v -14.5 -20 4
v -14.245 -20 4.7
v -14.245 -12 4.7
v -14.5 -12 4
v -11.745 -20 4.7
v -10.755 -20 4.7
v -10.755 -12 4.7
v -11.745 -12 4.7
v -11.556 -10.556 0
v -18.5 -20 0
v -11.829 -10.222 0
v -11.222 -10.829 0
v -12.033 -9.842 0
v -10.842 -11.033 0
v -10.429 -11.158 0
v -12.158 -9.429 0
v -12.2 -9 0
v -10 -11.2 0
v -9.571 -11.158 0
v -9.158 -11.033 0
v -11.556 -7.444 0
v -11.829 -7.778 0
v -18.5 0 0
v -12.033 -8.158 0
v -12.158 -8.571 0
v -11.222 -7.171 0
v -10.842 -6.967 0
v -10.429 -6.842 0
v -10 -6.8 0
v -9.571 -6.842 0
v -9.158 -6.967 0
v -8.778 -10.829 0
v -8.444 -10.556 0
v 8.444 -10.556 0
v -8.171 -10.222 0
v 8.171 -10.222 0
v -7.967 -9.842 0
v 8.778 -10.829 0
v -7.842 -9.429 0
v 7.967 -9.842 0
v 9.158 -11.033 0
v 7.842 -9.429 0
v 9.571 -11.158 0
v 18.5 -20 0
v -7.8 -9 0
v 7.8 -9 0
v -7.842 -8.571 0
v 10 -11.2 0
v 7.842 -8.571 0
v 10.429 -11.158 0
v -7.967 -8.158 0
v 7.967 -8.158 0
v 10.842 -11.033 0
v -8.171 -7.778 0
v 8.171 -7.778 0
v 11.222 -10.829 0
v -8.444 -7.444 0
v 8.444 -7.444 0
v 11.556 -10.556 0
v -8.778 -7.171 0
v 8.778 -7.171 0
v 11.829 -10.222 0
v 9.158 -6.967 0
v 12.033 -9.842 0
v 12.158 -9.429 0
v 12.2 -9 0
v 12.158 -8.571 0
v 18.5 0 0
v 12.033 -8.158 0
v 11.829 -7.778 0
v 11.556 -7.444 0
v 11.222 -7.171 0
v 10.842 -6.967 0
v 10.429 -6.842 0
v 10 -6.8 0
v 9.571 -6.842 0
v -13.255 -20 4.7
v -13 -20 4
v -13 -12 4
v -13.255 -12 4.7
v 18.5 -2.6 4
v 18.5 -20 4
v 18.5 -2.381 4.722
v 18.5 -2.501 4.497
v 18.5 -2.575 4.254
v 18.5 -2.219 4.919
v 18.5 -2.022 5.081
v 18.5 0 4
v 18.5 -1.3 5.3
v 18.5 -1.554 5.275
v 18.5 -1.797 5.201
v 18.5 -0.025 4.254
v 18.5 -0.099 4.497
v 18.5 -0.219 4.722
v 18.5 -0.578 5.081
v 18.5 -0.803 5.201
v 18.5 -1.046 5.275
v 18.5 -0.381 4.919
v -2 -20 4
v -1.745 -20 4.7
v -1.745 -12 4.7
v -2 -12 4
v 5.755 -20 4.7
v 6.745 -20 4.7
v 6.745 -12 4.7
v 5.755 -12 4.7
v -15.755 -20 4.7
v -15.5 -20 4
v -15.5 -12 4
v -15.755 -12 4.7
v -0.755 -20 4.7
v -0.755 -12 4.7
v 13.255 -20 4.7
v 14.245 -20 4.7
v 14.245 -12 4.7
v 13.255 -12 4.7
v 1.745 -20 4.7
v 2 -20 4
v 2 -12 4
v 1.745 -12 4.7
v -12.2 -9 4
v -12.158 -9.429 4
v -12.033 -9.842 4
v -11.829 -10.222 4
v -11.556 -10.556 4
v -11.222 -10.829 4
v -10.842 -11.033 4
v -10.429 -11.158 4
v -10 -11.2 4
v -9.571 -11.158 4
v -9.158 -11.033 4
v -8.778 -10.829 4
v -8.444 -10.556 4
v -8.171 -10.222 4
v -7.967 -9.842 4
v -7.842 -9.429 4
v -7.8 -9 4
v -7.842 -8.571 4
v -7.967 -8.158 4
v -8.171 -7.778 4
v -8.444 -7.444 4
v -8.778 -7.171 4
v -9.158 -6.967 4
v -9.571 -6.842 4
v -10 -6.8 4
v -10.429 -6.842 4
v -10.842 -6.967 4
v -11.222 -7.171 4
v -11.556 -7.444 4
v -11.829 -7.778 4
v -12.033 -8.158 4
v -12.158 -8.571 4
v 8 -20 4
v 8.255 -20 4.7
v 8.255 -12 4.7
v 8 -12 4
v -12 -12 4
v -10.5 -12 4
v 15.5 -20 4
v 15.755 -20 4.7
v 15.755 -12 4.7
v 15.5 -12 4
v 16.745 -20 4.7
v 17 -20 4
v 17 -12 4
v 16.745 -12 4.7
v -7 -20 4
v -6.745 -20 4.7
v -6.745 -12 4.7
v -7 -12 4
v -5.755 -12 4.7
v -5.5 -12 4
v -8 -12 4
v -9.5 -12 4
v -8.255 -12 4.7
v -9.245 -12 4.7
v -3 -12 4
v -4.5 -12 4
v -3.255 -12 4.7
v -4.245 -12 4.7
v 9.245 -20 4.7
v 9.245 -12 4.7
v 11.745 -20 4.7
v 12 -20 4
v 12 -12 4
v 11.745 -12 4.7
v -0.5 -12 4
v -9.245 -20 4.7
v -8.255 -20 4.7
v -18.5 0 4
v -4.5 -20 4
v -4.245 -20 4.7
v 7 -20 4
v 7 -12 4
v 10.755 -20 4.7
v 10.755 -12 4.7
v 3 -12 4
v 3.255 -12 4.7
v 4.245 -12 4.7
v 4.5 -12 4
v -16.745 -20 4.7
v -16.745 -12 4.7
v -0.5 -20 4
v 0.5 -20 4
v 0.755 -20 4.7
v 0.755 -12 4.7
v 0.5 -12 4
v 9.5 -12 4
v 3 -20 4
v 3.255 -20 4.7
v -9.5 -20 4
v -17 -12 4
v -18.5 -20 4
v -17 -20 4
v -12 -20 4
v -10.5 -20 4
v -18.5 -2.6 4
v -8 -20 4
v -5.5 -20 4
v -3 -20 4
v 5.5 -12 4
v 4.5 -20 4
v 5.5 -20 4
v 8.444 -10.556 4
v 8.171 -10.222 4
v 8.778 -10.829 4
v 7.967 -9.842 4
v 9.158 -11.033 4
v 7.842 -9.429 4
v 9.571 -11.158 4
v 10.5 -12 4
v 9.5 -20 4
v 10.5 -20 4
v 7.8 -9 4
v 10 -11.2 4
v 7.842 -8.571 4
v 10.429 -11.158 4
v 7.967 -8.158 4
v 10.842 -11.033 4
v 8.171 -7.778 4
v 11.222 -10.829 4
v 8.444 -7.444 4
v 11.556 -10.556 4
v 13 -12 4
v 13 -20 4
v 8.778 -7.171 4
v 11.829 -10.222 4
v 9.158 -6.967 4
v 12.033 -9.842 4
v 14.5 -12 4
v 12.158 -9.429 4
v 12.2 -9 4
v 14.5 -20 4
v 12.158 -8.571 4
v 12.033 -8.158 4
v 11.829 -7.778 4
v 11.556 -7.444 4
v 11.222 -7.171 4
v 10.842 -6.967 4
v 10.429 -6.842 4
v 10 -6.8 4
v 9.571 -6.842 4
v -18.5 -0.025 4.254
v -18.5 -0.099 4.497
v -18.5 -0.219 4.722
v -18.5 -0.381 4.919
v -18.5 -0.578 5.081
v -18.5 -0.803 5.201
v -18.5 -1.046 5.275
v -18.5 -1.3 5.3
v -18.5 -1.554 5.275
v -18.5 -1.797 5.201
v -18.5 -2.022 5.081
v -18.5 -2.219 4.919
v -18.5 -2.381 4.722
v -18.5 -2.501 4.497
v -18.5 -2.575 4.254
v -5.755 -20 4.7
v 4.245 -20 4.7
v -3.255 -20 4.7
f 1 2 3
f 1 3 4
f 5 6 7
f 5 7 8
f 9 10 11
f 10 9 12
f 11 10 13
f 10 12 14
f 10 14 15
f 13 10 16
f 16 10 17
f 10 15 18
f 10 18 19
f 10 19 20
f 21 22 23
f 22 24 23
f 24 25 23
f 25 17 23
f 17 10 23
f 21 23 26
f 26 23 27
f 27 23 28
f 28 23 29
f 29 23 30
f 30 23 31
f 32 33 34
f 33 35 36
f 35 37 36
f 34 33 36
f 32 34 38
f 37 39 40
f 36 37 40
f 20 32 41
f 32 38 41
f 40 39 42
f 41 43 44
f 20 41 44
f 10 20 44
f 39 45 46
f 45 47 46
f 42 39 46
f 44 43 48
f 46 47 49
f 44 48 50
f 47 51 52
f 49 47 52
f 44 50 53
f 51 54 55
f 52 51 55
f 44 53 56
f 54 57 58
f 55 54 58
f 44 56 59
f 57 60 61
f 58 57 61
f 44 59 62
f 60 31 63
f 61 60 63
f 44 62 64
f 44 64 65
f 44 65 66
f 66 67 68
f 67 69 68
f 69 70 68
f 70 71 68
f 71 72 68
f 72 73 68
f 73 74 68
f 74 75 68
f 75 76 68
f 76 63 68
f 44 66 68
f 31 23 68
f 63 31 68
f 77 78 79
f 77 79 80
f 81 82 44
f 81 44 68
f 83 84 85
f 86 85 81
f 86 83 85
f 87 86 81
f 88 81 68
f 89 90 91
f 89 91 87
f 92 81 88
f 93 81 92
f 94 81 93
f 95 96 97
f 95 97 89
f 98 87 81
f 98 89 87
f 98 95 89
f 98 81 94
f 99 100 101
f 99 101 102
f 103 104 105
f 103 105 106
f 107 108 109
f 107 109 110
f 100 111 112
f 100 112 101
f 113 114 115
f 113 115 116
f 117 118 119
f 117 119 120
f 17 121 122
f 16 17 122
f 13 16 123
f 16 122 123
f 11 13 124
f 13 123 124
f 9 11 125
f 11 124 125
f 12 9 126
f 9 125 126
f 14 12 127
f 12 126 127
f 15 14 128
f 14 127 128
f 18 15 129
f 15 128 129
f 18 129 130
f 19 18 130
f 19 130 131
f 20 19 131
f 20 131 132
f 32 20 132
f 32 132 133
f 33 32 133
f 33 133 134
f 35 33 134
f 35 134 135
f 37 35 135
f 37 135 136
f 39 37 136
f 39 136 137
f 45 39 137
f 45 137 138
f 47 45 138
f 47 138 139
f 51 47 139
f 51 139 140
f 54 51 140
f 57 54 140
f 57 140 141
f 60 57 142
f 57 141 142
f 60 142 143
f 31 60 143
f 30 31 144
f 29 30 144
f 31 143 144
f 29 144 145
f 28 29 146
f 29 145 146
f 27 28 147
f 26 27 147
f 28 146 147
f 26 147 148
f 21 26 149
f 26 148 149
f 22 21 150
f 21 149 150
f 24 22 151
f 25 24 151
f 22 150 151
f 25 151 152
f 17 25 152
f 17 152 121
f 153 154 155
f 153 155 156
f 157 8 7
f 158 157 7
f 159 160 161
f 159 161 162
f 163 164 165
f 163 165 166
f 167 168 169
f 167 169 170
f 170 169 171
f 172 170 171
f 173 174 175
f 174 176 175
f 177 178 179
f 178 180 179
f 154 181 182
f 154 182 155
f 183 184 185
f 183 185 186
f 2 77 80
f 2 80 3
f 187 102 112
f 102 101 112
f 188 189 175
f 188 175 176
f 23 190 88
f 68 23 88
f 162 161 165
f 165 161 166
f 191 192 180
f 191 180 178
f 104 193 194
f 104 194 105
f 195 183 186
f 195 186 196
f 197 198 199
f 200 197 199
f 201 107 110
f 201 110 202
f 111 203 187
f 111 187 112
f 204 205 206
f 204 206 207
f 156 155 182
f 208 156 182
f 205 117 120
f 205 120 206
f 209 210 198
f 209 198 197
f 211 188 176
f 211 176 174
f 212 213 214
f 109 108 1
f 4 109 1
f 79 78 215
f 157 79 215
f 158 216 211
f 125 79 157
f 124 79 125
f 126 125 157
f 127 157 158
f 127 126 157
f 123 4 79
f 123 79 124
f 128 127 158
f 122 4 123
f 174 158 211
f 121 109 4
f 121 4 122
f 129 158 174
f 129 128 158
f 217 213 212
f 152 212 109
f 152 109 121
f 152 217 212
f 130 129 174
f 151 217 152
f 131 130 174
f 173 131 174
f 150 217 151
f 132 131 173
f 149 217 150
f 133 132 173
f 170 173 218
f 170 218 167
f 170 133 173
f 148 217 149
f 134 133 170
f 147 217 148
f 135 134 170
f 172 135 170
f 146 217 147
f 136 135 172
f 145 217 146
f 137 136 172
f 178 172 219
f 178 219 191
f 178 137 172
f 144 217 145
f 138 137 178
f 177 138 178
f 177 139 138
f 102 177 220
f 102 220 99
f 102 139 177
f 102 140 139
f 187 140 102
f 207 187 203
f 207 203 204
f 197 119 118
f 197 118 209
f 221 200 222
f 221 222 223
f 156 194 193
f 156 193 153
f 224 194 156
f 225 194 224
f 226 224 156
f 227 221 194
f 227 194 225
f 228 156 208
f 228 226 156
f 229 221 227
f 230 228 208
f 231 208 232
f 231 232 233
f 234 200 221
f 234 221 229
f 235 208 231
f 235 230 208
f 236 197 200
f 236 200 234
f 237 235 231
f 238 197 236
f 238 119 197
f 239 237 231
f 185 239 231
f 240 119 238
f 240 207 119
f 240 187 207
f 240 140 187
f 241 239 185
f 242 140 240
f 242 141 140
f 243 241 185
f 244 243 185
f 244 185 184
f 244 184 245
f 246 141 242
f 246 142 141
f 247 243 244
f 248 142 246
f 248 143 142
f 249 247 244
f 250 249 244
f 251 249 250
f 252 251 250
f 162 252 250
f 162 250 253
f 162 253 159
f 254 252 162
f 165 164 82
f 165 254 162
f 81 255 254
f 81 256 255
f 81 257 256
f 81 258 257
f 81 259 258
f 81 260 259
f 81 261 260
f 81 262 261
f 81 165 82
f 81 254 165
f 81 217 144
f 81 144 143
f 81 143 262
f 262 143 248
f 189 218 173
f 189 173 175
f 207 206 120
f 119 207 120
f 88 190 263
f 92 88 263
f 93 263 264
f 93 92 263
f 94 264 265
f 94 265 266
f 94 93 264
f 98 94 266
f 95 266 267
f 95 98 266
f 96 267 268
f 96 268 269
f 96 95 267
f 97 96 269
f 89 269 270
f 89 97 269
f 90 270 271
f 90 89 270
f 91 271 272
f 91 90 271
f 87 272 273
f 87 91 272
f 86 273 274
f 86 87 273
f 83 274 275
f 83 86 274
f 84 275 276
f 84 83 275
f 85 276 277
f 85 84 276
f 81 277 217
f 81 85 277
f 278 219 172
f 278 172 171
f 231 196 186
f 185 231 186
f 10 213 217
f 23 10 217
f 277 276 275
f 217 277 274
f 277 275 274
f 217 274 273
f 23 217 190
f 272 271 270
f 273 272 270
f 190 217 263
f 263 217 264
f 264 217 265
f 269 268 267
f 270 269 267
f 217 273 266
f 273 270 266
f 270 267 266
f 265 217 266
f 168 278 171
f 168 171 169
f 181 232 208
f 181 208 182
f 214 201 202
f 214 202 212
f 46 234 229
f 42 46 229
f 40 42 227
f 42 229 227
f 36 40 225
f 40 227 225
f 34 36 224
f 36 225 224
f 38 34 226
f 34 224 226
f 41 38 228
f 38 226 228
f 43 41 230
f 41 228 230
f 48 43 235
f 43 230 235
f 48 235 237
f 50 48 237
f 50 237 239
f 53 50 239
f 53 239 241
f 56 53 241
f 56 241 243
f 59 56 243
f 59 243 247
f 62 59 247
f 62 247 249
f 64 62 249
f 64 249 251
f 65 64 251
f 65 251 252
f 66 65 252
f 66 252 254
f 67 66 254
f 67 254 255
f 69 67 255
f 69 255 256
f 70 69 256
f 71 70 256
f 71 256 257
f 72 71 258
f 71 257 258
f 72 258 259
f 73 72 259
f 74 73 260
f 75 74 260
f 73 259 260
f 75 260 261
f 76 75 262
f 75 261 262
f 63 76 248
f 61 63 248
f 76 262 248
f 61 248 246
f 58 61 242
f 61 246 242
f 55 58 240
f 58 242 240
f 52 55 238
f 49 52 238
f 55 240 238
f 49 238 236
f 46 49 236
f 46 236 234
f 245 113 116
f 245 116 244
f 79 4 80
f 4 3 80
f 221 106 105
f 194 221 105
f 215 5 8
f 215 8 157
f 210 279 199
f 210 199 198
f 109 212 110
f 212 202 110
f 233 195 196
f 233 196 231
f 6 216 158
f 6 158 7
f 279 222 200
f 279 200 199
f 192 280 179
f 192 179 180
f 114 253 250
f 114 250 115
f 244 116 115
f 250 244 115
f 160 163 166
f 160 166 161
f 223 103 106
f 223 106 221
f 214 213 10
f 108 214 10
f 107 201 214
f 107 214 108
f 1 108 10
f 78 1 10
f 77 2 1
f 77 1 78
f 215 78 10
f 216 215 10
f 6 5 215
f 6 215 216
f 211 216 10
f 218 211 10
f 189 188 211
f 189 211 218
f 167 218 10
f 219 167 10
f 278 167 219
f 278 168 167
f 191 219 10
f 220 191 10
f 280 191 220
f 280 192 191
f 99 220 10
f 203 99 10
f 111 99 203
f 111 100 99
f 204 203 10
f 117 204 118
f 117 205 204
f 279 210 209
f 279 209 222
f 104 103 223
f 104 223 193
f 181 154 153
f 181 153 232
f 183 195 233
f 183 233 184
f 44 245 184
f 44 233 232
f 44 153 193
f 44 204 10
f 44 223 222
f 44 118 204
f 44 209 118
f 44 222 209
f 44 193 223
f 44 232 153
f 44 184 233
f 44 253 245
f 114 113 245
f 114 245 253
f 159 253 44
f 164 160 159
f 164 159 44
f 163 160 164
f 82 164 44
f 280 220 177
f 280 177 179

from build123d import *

# Parameters (mm, degrees)
F0_W     = 37
F0_H     = 4
F1_DEPTH = 20
F3_DEPTH = 8
F5_DEPTH = 37
F7_D     = 4.4
F7_DEPTH = 10
F7_TIP   = 1.3218933619


with BuildPart() as f1:
    # F0 (on Front) → F1 (new body)
    with BuildSketch(Plane.XZ):
        with Locations((0, 2)):
            Rectangle(F0_W, F0_H)
    extrude(amount=F1_DEPTH)

    # F2 (on face) → F3 (join)
    with BuildSketch(Plane.XZ.offset(20)):
        Polygon((0.754779164, 4.7), (0.5, 4), (2, 4), (1.745220836, 4.7), align=None)
        Polygon((-2, 4), (-0.5, 4), (-0.754779164, 4.7), (-1.745220836, 4.7), align=None)
        Polygon((4.5, 4), (4.245220836, 4.7), (3.254779164, 4.7), (3, 4), align=None)
        Polygon((7, 4), (6.745220836, 4.7), (5.754779164, 4.7), (5.5, 4), align=None)
        Polygon((9.5, 4), (9.245220836, 4.7), (8.254779164, 4.7), (8, 4), align=None)
        Polygon((12, 4), (11.745220836, 4.7), (10.754779164, 4.7), (10.5, 4), align=None)
        Polygon((14.5, 4), (14.245220836, 4.7), (13.254779164, 4.7), (13, 4), align=None)
        Polygon((17, 4), (16.745220836, 4.7), (15.754779164, 4.7), (15.5, 4), align=None)
        Polygon((-9.5, 4), (-8, 4), (-8.254779164, 4.7), (-9.245220836, 4.7), align=None)
        Polygon((-17, 4), (-15.5, 4), (-15.754779164, 4.7), (-16.745220836, 4.7), align=None)
        Polygon((-5.754779164, 4.7), (-6.745220836, 4.7), (-7, 4), (-5.5, 4), align=None)
        Polygon((-4.5, 4), (-3, 4), (-3.254779164, 4.7), (-4.245220836, 4.7), align=None)
        Polygon((-14.5, 4), (-13, 4), (-13.254779164, 4.7), (-14.245220836, 4.7), align=None)
        Polygon((-10.754779164, 4.7), (-11.745220836, 4.7), (-12, 4), (-10.5, 4), align=None)
    extrude(amount=-F3_DEPTH)

    # F4 (on face) → F5 (join, through all)
    with BuildSketch(Plane.YZ.offset(18.5)):
        with BuildLine():
            Line((-2.6, 4), (0, 4))
            ThreePointArc((0, 4), (-1.3, 5.3), (-2.6, 4))
        make_face()
    extrude(amount=-F5_DEPTH)

    # F7
    with Locations(Plane(origin=(0, 0, 0), x_dir=(1, 0, 0), z_dir=(0, 0, -1))):
        with Locations((10, 9), (-10, 9)):
            Hole(F7_D / 2, depth=F7_DEPTH)
            with Locations((0, 0, -(F7_DEPTH + F7_TIP / 2))):  # 118° drill point
                Cone(0, F7_D / 2, F7_TIP, mode=Mode.SUBTRACT)


solid = f1.part
